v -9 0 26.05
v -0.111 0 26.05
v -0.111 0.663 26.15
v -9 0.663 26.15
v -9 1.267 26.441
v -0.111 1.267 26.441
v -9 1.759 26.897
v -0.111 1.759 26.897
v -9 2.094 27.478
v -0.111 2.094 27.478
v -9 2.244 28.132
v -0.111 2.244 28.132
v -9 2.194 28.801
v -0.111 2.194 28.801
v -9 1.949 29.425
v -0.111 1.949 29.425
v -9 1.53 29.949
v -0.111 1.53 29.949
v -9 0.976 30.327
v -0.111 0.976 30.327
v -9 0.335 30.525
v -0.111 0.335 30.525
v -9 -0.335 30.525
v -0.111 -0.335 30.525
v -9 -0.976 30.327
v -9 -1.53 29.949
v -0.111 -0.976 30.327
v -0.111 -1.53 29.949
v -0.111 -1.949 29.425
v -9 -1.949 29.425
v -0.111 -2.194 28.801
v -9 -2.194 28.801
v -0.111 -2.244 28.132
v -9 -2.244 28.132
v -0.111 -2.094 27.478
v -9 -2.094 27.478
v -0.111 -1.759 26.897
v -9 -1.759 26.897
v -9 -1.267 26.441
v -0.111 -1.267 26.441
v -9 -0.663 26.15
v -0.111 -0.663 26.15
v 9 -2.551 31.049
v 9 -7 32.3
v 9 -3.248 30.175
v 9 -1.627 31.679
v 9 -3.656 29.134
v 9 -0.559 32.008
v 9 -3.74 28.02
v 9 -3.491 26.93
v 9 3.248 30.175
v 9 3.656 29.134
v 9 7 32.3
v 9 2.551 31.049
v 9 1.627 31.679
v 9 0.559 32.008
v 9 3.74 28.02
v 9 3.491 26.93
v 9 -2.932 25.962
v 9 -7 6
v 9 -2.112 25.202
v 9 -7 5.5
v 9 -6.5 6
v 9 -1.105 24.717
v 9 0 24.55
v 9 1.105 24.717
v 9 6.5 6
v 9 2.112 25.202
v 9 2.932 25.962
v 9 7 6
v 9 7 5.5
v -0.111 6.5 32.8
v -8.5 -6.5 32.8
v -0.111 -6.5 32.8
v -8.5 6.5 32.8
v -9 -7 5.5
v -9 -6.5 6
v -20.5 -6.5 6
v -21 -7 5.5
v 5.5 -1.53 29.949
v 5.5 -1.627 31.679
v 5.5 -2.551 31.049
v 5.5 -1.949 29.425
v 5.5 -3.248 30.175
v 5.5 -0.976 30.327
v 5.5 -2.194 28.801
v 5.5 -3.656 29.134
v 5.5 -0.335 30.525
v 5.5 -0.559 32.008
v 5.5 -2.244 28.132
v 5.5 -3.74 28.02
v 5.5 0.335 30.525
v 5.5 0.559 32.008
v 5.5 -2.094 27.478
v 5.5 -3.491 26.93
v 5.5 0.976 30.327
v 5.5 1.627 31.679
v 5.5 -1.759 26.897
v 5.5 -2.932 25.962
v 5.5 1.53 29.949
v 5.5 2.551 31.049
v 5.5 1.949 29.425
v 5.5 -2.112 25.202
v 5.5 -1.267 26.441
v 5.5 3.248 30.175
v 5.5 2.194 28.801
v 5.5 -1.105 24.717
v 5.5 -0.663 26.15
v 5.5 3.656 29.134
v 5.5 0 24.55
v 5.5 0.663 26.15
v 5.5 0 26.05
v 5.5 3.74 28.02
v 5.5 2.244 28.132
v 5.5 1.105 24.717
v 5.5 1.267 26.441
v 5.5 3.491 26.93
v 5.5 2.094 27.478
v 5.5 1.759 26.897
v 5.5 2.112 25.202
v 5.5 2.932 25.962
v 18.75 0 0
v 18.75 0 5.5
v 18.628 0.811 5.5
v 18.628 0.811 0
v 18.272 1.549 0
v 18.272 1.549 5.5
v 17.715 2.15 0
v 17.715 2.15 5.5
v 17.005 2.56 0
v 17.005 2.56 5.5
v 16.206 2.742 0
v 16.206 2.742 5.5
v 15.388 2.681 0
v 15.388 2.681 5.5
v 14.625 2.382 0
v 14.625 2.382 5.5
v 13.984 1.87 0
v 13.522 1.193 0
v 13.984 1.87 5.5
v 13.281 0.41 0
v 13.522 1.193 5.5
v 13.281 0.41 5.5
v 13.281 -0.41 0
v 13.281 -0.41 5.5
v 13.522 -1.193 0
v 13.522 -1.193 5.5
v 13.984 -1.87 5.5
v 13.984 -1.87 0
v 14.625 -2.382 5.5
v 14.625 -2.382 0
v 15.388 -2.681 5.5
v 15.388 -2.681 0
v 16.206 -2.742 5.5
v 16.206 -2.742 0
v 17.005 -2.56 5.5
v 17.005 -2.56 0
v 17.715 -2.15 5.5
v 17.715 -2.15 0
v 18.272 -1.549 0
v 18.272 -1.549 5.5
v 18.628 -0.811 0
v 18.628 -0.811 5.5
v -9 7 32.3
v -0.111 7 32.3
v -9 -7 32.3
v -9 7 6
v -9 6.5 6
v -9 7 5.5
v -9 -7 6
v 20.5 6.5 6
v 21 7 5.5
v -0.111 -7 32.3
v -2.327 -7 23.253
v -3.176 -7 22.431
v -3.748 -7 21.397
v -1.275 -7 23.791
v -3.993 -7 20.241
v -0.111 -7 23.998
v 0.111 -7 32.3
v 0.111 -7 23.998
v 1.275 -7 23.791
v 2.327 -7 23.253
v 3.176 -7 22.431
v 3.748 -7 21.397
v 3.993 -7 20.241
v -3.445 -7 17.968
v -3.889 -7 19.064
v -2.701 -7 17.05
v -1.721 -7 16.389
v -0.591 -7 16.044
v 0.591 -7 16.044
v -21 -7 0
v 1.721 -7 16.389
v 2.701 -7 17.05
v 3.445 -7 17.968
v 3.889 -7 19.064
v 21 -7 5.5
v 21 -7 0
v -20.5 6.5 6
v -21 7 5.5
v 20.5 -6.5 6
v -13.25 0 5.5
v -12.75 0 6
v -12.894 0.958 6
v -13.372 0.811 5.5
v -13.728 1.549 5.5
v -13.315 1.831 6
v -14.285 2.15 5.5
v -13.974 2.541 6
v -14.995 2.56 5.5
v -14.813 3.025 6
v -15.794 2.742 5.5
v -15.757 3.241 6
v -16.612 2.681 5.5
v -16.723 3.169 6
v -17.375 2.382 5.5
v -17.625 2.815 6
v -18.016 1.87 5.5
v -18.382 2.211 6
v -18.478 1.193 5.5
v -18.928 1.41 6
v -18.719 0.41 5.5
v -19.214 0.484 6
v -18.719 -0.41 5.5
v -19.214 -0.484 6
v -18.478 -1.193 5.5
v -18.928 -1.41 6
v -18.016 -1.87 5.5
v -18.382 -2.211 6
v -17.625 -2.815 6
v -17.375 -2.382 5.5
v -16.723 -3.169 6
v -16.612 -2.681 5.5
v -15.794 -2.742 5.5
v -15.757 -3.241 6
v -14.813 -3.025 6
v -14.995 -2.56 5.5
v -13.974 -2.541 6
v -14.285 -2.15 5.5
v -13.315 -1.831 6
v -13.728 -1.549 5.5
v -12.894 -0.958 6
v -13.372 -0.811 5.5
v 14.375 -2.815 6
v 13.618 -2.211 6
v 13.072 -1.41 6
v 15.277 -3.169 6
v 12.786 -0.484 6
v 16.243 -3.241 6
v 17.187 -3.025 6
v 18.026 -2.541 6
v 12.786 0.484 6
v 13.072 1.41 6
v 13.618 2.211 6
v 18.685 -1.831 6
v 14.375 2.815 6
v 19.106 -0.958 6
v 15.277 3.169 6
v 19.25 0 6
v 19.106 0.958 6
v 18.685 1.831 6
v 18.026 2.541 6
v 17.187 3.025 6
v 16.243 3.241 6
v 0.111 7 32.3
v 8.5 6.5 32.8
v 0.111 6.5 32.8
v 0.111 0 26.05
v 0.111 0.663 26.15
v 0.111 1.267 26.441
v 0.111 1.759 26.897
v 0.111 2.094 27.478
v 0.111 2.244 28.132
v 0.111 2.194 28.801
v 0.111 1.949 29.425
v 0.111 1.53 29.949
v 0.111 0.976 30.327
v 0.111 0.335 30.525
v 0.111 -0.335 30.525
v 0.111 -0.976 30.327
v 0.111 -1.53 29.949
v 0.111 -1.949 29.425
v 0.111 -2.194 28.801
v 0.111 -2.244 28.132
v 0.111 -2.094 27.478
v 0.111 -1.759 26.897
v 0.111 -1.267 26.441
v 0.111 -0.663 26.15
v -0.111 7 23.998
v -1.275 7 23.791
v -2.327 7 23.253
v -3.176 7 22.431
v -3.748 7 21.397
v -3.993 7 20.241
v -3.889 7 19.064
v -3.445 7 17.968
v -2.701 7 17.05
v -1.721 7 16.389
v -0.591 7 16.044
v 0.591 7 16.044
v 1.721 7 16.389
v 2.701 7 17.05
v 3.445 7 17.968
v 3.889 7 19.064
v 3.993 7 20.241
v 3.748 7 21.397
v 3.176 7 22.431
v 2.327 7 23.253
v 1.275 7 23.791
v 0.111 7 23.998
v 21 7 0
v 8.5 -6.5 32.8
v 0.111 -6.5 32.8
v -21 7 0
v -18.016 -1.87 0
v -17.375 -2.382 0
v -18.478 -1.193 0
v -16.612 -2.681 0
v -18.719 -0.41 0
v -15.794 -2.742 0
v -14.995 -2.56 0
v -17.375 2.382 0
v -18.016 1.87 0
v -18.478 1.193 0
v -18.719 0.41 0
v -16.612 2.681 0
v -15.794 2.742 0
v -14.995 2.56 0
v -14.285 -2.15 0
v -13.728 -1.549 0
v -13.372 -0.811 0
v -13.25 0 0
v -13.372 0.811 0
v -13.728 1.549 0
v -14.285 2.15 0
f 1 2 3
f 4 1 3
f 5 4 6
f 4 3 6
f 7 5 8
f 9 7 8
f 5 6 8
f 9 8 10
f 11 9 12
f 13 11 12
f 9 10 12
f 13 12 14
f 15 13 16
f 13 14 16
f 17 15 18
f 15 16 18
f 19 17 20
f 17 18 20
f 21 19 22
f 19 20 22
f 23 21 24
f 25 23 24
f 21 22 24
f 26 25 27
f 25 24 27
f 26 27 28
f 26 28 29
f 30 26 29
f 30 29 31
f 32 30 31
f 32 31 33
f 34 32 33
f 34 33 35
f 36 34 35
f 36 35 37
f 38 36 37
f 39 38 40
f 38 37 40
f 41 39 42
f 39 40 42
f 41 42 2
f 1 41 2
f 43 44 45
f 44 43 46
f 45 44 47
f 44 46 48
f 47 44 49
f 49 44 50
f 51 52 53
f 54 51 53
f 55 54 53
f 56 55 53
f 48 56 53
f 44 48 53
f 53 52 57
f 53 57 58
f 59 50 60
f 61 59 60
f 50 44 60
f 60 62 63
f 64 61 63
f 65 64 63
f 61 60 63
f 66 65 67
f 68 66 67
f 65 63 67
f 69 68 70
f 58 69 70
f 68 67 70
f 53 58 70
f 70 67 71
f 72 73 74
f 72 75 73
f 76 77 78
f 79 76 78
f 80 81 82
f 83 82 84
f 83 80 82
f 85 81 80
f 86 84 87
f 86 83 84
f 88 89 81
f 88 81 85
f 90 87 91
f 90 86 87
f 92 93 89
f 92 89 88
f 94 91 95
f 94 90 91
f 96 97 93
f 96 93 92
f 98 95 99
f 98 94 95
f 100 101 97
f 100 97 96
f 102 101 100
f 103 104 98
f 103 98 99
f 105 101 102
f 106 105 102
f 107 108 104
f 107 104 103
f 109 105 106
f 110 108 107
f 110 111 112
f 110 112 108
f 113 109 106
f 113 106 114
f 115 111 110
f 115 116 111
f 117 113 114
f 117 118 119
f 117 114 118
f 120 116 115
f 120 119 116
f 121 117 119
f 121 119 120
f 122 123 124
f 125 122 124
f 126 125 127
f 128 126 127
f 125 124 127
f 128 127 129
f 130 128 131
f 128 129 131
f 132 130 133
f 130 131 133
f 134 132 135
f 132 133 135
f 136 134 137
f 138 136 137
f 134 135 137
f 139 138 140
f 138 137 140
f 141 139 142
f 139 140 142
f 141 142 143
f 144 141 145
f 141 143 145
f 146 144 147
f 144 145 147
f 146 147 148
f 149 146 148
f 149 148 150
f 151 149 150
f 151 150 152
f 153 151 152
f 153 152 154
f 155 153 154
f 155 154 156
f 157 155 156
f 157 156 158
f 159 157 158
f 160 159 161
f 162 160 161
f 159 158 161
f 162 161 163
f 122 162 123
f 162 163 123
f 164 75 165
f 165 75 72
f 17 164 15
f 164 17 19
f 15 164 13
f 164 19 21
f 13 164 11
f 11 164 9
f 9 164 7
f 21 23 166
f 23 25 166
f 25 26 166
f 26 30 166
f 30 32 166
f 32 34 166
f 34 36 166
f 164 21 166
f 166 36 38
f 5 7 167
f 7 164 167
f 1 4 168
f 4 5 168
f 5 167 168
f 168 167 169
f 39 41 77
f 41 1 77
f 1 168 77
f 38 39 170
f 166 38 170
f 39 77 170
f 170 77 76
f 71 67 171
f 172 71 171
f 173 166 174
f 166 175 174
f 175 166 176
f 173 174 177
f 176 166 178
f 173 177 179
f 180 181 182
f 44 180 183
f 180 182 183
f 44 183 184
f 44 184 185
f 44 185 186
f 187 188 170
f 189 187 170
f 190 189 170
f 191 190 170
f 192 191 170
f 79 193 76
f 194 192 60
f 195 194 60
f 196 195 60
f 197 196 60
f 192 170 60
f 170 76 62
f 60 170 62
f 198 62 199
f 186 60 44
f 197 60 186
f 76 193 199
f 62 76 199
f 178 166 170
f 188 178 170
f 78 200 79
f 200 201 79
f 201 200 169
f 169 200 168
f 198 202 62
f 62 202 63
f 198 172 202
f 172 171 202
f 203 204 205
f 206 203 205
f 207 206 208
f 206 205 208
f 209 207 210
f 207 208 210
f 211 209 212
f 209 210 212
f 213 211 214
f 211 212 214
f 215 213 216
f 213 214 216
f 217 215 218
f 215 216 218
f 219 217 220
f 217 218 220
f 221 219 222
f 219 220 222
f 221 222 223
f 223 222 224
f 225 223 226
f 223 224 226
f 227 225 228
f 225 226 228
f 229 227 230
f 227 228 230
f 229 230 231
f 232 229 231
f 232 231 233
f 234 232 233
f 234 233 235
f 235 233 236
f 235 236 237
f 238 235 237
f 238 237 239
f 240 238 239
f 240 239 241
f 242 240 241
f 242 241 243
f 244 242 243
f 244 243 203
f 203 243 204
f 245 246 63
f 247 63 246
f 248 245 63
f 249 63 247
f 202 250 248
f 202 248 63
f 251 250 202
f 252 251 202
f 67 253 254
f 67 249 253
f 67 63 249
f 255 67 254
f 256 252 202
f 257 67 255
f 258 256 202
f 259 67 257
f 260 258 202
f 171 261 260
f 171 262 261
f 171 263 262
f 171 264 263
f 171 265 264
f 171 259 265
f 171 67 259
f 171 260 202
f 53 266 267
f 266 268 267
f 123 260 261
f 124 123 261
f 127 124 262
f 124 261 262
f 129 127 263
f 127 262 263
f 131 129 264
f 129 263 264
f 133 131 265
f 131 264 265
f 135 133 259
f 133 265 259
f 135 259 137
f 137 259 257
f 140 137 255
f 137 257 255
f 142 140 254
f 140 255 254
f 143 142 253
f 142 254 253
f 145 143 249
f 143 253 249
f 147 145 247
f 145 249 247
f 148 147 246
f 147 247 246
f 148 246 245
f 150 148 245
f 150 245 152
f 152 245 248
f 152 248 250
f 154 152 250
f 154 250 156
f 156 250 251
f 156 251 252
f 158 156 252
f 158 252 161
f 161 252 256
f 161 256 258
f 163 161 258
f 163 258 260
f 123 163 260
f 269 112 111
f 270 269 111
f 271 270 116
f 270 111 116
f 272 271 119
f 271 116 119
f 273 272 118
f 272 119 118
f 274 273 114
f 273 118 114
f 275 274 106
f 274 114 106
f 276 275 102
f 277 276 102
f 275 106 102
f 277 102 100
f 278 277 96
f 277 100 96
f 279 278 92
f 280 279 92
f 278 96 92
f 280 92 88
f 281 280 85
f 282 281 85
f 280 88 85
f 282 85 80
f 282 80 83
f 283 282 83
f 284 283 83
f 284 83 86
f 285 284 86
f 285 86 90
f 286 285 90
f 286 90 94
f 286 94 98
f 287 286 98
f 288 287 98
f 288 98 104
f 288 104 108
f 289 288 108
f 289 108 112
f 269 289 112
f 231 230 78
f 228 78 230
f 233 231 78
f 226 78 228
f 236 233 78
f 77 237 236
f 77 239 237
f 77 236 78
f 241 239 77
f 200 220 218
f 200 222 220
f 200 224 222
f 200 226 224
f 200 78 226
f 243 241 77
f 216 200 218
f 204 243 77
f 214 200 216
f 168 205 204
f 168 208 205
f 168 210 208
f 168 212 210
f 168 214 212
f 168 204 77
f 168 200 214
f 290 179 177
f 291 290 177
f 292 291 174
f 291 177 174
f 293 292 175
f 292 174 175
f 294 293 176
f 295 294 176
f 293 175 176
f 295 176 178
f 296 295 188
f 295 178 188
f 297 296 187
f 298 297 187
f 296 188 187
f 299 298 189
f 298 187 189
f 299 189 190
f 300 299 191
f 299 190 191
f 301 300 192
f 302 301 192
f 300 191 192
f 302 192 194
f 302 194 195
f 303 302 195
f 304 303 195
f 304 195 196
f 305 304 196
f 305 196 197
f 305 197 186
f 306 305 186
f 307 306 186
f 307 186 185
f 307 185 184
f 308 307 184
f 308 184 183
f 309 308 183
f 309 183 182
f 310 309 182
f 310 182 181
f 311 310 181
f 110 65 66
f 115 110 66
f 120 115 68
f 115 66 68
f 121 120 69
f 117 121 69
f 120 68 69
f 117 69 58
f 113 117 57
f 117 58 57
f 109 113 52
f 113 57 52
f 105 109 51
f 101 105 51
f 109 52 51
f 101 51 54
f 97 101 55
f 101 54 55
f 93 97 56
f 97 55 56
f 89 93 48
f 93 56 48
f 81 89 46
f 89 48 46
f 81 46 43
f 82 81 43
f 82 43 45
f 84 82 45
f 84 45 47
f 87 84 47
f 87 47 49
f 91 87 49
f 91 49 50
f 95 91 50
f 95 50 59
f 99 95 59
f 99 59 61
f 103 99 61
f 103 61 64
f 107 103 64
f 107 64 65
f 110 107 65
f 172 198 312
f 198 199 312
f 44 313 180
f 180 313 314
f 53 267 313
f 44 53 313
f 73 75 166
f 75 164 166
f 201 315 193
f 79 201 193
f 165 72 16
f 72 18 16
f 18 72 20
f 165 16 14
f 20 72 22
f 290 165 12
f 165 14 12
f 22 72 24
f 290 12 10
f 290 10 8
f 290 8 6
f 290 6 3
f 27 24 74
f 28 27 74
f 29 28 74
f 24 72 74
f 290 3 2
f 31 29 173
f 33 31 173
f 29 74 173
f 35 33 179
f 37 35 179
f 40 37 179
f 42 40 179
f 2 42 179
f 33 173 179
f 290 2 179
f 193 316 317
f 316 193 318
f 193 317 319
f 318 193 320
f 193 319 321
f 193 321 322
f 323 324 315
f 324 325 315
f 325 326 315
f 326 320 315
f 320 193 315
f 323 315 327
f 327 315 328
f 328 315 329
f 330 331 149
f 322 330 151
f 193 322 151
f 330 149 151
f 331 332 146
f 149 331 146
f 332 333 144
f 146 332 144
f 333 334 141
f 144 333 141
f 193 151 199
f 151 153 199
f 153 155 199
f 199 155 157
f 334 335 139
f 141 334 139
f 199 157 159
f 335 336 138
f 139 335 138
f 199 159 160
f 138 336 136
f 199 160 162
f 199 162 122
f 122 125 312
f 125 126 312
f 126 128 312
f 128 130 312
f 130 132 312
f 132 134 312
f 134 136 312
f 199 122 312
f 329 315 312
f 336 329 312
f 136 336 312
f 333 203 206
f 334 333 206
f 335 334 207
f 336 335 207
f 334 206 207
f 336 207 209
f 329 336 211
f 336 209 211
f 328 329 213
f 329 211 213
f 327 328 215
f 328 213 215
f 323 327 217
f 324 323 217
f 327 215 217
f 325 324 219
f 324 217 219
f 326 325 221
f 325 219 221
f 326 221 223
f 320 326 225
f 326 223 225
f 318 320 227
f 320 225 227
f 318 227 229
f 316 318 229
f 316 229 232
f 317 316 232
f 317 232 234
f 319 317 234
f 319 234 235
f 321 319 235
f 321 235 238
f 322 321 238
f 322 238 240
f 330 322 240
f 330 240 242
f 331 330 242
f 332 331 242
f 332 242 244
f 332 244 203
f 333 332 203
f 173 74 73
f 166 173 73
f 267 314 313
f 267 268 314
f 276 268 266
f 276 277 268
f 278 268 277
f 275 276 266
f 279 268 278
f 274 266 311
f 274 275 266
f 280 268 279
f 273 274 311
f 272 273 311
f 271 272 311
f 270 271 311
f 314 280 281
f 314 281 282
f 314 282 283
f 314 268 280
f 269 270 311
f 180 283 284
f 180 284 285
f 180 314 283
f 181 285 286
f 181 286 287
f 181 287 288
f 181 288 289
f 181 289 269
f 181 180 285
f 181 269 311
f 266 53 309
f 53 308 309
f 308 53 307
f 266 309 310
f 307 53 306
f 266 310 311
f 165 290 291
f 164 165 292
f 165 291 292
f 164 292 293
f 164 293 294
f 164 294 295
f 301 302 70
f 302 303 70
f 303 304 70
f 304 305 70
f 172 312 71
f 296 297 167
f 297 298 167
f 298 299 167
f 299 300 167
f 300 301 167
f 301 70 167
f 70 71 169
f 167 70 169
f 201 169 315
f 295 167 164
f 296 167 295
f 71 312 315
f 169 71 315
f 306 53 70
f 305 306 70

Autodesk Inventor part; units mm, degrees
ref_plane "YZ Plane" through (0, 0, 0) normal (1, 0, 0) x (0, 1, 0)
ref_plane "XZ Plane" through (0, 0, 0) normal (0, 1, 0) x (-1, 0, 0)
ref_plane "XY Plane" through (0, 0, 0) normal (0, 0, 1) x (1, 0, 0)
sketch "Skizze1" plane through (0, 0, 0) normal (0, 0, 1) x (1, 0, 0)
  line L0 (21, 7) -> (-21, 7)
  line L1 (-21, 7) -> (-21, -7)
  line L2 (-21, -7) -> (21, -7)
  line L3 (21, -7) -> (21, 7)
  line L4 (21, 7) -> (-21, -7) construction
  line L5 (-21, 7) -> (21, -7) construction
  point P0 (0, 0)
  dimension "d0" = 42
  dimension "d1" = 14
extrude "Extrusion1" add sketch "Skizze1" along normal blind 6
sketch "Skizze2" plane through (0, 0, 6) normal (0, 0, 1) x (1, 0, 0)
  line L0 (21, 7) -> (-21, 7) projected
  line L1 (-9, -7) -> (9, -7)
  line L2 (9, -7) -> (9, 7)
  line L3 (9, 7) -> (-9, 7)
  line L4 (-9, 7) -> (-9, -7)
  line L5 (-9, -7) -> (9, 7) construction
  line L6 (9, -7) -> (-9, 7) construction
  point P0 (0, 0)
  dimension "d4" = 18
extrude "Extrusion2" add sketch "Skizze2" along normal blind 26.8
sketch "Skizze3" plane through (-21, -7, 0) normal (0, -1, 0) x (1, 0, 0)
  line L0 (20.8889, 32.8) -> (20.8889, 23.9985)
  line L1 (21.1111, 32.8) -> (21.1111, 23.9985)
  arc A0 (20.8889, 23.9985) -> (21.1111, 23.9985) centre (21, 20) ccw
  line L2 (20.8889, 32.8) -> (21.1111, 32.8)
  line L3 (0, 0) -> (42, 0) projected
  line L4 (12, 32.8) -> (30, 32.8) projected
  point P0 (21, 0)
  dimension "d28" = 20
  dimension "d29" = 4
  dimension "d30" = 0
extrude "Extrusion3" cut sketch "Skizze3" against normal through all
sketch "Skizze4" plane through (9, -7, 6) normal (1, 0, 0) x (0, 0, -1)
  circle A0 centre (-22.3, 7) radius 2.25
  line L0 (-26.8, 0) -> (-26.8, 14) projected
  point P0 (6, 7)
  dimension "d13" = 4.5
  dimension "d31" = 4.5
extrude "Extrusion4" cut sketch "Skizze4" against normal through all
sketch "Skizze5" plane through (9, -7, 6) normal (1, 0, 0) x (0, 0, -1)
  circle A0 centre (-22.3, 7) radius 2.25 projected
  circle A1 centre (-22.3, 7) radius 3.75
  point P0 (6, 7)
  dimension "d16" = 7.5
extrude "Extrusion5" cut sketch "Skizze5" against normal blind 3.5
sketch "Skizze6" plane through (0, 0, 6) normal (0, 0, 1) x (1, 0, 0)
  circle A0 centre (16, 0) radius 2.75
  circle A1 centre (-16, 0) radius 2.75
  line L0 (-21, 7) -> (-21, -7) projected
  point P0 (0, 0)
  dimension "d19" = 5.5
  dimension "d20" = 5.5
  dimension "d21" = 32
  dimension "d22" = 5
extrude "Extrusion6" cut sketch "Skizze6" against normal up to next
chamfer "Fase1" distance 0.5 angle 45 14 edges at (21, 0, 6) (-21, 0, 6) (15, 7, 6) (-15, 7, 6) (-15, -7, 6) (15, -7, 6) (9, 0, 32.8) (-9, 0, 32.8) (-4.5556, -7, 32.8) (4.5556, -7, 32.8) (4.5556, 7, 32.8) (-4.5556, 7, 32.8) (13.25, 0, 6) (-18.75, 0, 6)
properties part number "SK12" material "Aluminium 5005"
